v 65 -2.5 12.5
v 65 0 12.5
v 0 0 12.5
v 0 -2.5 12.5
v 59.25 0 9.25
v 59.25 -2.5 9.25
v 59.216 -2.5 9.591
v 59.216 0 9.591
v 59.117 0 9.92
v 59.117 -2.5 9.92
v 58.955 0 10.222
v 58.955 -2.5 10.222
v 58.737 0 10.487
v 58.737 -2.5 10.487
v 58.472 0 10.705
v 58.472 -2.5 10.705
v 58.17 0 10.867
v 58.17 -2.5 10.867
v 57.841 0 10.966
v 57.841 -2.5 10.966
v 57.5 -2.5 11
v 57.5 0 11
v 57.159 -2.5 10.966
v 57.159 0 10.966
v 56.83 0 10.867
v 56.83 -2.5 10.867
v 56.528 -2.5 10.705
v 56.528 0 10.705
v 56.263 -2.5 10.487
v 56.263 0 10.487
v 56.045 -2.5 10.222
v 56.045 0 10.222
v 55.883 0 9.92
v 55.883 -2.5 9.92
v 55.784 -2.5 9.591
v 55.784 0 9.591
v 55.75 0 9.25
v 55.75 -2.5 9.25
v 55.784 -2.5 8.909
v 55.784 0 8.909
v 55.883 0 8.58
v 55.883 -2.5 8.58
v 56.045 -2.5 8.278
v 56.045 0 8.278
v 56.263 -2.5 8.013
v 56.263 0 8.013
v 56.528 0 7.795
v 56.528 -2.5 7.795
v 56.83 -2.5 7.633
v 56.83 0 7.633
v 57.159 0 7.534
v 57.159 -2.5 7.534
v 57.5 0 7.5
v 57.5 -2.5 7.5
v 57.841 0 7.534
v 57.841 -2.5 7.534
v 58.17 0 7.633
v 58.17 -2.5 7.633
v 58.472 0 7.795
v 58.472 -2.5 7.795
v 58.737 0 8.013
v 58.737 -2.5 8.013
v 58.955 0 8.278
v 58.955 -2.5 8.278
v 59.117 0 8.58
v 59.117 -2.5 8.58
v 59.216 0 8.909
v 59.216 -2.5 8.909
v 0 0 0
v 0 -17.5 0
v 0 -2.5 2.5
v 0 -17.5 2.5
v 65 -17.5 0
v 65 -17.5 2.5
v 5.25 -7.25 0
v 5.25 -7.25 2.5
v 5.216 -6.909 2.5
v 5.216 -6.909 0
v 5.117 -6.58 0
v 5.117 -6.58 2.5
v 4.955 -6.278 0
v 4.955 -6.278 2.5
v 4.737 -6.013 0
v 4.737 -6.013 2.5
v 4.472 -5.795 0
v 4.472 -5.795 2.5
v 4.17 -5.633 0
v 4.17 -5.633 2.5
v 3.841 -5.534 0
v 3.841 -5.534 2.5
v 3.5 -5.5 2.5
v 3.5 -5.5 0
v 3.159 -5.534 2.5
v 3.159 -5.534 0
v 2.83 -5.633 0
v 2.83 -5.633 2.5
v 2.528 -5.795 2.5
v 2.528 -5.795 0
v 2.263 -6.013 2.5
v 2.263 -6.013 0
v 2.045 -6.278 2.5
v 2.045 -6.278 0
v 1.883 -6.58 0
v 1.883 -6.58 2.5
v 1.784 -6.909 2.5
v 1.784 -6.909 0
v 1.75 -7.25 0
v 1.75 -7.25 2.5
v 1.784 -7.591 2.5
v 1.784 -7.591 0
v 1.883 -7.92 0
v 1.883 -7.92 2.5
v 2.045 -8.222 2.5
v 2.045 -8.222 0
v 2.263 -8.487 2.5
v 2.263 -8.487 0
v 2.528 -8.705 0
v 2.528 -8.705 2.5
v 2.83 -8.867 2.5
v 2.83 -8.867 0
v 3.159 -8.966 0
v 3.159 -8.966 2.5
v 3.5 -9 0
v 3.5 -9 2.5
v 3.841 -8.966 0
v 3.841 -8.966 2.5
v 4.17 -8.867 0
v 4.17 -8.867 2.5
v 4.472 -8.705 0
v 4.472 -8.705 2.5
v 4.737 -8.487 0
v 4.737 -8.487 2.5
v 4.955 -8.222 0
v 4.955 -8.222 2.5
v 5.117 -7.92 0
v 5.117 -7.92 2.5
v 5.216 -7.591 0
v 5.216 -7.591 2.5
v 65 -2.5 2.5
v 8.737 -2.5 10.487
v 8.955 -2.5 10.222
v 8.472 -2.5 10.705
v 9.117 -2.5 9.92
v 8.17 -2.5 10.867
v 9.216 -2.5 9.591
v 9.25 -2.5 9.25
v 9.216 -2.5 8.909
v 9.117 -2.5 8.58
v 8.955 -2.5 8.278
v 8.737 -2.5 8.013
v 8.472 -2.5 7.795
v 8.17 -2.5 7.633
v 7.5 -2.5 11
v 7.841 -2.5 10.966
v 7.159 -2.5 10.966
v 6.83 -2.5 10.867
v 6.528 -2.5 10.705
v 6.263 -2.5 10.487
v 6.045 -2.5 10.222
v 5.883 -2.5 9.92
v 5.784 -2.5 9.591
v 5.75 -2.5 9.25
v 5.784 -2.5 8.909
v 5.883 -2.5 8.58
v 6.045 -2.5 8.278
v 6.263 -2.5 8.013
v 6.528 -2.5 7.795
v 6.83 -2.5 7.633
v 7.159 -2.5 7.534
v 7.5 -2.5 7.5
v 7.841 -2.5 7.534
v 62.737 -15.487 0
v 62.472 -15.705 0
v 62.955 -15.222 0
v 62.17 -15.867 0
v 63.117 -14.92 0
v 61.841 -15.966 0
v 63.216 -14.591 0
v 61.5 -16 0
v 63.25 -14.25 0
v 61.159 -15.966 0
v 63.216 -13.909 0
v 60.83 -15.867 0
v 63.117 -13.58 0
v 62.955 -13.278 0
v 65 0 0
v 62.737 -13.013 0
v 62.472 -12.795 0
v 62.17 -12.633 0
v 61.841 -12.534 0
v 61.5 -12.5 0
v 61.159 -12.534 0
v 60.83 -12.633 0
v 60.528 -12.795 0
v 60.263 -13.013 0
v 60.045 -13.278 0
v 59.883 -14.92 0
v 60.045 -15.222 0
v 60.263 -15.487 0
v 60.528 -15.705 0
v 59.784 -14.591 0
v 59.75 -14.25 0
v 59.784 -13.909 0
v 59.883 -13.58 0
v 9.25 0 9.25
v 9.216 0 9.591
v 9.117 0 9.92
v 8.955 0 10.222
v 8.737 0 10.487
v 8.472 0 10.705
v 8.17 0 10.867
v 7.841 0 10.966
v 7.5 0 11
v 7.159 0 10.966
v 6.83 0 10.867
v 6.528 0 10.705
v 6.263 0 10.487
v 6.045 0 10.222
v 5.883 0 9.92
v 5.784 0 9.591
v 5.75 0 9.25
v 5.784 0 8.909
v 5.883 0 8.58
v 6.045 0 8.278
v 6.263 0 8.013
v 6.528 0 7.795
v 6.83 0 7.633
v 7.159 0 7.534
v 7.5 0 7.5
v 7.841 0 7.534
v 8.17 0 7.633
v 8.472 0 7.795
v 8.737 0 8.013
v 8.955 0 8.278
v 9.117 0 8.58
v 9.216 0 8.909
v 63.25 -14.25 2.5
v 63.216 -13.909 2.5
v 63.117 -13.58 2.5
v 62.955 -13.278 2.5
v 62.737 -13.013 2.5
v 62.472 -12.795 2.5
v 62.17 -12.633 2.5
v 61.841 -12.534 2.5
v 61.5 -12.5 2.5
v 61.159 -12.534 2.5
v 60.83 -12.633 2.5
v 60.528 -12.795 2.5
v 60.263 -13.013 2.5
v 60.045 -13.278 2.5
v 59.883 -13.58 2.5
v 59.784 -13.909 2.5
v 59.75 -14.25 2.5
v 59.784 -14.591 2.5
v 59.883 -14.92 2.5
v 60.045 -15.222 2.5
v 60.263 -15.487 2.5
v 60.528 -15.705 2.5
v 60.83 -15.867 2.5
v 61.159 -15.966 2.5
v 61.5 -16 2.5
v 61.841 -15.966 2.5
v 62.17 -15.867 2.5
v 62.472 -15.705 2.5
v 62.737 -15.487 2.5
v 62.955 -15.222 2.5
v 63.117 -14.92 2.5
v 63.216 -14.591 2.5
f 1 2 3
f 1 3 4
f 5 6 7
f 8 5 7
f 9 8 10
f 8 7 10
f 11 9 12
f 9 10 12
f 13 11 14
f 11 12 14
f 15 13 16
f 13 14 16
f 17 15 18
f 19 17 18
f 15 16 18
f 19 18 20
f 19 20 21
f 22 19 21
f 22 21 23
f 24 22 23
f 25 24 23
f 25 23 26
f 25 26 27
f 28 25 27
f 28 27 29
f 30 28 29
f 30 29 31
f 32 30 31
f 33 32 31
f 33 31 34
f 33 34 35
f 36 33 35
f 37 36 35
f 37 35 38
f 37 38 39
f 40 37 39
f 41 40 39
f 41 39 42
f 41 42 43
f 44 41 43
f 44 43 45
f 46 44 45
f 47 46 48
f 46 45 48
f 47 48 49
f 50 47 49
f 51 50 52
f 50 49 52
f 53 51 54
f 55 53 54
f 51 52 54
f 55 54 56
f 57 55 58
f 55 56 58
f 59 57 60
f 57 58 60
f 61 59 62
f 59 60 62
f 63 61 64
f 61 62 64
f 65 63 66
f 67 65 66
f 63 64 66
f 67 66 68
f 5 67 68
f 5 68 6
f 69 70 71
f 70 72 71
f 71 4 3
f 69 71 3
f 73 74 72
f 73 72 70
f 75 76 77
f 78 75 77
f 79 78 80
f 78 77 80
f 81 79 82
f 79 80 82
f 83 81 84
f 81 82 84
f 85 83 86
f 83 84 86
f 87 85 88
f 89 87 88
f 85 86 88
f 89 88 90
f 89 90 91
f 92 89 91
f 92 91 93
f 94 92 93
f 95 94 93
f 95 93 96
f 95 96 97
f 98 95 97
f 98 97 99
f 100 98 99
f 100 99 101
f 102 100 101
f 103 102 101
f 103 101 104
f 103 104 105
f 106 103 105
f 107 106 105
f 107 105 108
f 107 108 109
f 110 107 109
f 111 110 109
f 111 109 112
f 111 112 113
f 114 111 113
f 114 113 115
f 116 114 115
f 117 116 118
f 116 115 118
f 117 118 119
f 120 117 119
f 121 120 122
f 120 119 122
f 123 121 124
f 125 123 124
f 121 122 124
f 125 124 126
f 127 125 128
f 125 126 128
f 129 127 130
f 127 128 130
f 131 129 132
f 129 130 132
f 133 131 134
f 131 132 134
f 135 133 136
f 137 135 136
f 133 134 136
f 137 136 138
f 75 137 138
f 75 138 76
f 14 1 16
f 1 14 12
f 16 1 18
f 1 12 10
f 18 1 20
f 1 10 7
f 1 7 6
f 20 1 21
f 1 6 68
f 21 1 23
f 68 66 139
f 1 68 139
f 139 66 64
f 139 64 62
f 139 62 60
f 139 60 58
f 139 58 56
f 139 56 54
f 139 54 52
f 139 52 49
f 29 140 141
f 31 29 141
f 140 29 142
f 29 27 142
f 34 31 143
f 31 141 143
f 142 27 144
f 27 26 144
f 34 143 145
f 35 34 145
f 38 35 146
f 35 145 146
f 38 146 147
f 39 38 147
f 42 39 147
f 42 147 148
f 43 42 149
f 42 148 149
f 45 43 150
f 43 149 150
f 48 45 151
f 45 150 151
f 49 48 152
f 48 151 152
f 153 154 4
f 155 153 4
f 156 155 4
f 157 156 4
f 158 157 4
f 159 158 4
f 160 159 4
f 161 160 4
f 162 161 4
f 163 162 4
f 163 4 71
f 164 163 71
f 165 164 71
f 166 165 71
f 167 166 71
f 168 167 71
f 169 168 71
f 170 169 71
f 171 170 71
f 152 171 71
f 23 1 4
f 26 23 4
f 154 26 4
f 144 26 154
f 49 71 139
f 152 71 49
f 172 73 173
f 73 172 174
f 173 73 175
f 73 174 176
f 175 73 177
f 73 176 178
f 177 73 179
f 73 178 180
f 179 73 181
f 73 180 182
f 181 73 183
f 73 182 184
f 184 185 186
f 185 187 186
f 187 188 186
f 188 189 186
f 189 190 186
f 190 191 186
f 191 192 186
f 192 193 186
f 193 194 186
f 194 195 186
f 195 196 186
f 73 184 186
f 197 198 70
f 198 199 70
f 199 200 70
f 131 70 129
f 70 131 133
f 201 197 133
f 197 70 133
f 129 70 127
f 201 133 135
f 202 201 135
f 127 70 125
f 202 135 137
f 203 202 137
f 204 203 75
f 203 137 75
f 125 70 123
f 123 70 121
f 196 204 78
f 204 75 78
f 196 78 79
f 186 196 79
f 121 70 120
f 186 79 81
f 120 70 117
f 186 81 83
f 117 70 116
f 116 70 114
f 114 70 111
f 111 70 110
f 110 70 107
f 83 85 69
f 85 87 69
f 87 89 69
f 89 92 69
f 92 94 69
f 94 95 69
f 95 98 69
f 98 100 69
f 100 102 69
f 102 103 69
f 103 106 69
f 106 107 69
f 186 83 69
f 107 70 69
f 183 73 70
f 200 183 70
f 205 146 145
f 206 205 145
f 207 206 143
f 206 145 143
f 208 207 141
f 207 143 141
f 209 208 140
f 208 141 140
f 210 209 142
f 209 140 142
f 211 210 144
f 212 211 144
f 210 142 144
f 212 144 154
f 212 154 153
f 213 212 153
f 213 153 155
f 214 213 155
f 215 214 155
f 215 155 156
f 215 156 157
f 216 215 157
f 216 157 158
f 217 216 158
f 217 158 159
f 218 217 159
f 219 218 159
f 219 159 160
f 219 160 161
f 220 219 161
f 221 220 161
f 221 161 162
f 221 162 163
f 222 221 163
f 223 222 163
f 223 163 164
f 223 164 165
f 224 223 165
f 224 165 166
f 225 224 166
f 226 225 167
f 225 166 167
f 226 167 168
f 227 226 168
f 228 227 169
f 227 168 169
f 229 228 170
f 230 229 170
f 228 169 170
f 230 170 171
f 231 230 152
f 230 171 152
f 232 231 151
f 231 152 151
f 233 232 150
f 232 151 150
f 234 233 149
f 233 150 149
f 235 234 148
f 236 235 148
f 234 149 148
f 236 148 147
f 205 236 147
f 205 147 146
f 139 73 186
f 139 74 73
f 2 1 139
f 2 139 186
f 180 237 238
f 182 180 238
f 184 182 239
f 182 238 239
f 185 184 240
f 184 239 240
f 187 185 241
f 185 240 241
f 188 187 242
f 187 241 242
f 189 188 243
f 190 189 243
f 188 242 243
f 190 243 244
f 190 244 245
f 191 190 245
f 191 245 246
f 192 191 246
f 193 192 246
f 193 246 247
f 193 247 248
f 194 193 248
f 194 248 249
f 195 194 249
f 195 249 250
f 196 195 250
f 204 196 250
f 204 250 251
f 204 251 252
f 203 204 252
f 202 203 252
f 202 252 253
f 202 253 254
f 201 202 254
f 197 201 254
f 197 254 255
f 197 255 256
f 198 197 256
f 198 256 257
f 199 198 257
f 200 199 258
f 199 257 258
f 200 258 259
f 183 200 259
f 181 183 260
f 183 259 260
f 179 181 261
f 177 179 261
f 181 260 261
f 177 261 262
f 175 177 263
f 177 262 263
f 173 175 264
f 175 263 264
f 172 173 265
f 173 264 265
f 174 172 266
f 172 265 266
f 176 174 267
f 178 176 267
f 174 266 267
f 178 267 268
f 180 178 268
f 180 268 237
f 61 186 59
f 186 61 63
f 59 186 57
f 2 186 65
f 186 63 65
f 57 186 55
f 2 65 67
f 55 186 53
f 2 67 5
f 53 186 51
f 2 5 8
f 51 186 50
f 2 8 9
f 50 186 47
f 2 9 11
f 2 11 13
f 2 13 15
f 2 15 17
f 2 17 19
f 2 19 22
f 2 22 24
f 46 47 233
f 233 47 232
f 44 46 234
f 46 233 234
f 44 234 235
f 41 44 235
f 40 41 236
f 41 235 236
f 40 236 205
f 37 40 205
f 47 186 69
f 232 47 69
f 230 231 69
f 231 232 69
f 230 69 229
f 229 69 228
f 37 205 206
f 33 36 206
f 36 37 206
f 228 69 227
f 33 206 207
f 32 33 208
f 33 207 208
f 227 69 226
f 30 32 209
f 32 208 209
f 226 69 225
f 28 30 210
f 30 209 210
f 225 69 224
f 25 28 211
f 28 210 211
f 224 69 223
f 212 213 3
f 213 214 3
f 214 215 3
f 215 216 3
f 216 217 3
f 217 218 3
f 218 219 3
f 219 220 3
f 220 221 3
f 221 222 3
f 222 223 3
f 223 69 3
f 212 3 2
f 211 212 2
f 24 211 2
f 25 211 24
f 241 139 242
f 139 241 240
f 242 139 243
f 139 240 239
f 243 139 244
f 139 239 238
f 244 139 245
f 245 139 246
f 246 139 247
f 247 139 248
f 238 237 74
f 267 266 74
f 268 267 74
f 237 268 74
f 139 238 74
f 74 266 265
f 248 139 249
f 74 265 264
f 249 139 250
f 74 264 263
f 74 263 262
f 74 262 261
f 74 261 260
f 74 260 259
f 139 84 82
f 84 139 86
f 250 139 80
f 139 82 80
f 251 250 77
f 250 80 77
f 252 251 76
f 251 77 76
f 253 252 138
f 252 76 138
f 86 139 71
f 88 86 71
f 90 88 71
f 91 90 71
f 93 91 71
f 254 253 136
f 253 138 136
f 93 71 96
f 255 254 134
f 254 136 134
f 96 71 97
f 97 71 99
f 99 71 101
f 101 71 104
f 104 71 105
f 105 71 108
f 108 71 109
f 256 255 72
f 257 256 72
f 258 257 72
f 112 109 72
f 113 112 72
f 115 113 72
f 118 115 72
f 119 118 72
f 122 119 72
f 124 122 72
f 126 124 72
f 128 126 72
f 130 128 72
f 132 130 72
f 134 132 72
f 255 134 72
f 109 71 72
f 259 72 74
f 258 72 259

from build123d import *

# Parameters (mm, degrees)
F1_DEPTH = 65
F2_R     = 1.75
F3_DEPTH = 2.501
F4_R     = 1.75
F5_DEPTH = 2.501


with BuildPart() as f1:
    # F0 (on Right) → F1 (new body)
    with BuildSketch(Plane.YZ):
        Polygon((-17.5, 0), (0, 0), (0, 12.5), (-2.5, 12.5), (-2.5, 2.5), (-17.5, 2.5), align=None)
    extrude(amount=F1_DEPTH)

    # F2 (on face) → F3 (cut, through all)
    with BuildSketch(Plane.XZ.offset(2.5)):
        with Locations((7.5, 9.25)):
            Circle(F2_R)
        with Locations((57.5, 9.25)):
            Circle(F2_R)
    extrude(amount=-F3_DEPTH, mode=Mode.SUBTRACT)

    # F4 (on face) → F5 (cut, through all)
    with BuildSketch(Plane.XY.offset(2.5)):
        with Locations((3.5, -7.25)):
            Circle(F4_R)
        with Locations((61.5, -14.25)):
            Circle(F4_R)
    extrude(amount=-F5_DEPTH, mode=Mode.SUBTRACT)


solid = f1.part
